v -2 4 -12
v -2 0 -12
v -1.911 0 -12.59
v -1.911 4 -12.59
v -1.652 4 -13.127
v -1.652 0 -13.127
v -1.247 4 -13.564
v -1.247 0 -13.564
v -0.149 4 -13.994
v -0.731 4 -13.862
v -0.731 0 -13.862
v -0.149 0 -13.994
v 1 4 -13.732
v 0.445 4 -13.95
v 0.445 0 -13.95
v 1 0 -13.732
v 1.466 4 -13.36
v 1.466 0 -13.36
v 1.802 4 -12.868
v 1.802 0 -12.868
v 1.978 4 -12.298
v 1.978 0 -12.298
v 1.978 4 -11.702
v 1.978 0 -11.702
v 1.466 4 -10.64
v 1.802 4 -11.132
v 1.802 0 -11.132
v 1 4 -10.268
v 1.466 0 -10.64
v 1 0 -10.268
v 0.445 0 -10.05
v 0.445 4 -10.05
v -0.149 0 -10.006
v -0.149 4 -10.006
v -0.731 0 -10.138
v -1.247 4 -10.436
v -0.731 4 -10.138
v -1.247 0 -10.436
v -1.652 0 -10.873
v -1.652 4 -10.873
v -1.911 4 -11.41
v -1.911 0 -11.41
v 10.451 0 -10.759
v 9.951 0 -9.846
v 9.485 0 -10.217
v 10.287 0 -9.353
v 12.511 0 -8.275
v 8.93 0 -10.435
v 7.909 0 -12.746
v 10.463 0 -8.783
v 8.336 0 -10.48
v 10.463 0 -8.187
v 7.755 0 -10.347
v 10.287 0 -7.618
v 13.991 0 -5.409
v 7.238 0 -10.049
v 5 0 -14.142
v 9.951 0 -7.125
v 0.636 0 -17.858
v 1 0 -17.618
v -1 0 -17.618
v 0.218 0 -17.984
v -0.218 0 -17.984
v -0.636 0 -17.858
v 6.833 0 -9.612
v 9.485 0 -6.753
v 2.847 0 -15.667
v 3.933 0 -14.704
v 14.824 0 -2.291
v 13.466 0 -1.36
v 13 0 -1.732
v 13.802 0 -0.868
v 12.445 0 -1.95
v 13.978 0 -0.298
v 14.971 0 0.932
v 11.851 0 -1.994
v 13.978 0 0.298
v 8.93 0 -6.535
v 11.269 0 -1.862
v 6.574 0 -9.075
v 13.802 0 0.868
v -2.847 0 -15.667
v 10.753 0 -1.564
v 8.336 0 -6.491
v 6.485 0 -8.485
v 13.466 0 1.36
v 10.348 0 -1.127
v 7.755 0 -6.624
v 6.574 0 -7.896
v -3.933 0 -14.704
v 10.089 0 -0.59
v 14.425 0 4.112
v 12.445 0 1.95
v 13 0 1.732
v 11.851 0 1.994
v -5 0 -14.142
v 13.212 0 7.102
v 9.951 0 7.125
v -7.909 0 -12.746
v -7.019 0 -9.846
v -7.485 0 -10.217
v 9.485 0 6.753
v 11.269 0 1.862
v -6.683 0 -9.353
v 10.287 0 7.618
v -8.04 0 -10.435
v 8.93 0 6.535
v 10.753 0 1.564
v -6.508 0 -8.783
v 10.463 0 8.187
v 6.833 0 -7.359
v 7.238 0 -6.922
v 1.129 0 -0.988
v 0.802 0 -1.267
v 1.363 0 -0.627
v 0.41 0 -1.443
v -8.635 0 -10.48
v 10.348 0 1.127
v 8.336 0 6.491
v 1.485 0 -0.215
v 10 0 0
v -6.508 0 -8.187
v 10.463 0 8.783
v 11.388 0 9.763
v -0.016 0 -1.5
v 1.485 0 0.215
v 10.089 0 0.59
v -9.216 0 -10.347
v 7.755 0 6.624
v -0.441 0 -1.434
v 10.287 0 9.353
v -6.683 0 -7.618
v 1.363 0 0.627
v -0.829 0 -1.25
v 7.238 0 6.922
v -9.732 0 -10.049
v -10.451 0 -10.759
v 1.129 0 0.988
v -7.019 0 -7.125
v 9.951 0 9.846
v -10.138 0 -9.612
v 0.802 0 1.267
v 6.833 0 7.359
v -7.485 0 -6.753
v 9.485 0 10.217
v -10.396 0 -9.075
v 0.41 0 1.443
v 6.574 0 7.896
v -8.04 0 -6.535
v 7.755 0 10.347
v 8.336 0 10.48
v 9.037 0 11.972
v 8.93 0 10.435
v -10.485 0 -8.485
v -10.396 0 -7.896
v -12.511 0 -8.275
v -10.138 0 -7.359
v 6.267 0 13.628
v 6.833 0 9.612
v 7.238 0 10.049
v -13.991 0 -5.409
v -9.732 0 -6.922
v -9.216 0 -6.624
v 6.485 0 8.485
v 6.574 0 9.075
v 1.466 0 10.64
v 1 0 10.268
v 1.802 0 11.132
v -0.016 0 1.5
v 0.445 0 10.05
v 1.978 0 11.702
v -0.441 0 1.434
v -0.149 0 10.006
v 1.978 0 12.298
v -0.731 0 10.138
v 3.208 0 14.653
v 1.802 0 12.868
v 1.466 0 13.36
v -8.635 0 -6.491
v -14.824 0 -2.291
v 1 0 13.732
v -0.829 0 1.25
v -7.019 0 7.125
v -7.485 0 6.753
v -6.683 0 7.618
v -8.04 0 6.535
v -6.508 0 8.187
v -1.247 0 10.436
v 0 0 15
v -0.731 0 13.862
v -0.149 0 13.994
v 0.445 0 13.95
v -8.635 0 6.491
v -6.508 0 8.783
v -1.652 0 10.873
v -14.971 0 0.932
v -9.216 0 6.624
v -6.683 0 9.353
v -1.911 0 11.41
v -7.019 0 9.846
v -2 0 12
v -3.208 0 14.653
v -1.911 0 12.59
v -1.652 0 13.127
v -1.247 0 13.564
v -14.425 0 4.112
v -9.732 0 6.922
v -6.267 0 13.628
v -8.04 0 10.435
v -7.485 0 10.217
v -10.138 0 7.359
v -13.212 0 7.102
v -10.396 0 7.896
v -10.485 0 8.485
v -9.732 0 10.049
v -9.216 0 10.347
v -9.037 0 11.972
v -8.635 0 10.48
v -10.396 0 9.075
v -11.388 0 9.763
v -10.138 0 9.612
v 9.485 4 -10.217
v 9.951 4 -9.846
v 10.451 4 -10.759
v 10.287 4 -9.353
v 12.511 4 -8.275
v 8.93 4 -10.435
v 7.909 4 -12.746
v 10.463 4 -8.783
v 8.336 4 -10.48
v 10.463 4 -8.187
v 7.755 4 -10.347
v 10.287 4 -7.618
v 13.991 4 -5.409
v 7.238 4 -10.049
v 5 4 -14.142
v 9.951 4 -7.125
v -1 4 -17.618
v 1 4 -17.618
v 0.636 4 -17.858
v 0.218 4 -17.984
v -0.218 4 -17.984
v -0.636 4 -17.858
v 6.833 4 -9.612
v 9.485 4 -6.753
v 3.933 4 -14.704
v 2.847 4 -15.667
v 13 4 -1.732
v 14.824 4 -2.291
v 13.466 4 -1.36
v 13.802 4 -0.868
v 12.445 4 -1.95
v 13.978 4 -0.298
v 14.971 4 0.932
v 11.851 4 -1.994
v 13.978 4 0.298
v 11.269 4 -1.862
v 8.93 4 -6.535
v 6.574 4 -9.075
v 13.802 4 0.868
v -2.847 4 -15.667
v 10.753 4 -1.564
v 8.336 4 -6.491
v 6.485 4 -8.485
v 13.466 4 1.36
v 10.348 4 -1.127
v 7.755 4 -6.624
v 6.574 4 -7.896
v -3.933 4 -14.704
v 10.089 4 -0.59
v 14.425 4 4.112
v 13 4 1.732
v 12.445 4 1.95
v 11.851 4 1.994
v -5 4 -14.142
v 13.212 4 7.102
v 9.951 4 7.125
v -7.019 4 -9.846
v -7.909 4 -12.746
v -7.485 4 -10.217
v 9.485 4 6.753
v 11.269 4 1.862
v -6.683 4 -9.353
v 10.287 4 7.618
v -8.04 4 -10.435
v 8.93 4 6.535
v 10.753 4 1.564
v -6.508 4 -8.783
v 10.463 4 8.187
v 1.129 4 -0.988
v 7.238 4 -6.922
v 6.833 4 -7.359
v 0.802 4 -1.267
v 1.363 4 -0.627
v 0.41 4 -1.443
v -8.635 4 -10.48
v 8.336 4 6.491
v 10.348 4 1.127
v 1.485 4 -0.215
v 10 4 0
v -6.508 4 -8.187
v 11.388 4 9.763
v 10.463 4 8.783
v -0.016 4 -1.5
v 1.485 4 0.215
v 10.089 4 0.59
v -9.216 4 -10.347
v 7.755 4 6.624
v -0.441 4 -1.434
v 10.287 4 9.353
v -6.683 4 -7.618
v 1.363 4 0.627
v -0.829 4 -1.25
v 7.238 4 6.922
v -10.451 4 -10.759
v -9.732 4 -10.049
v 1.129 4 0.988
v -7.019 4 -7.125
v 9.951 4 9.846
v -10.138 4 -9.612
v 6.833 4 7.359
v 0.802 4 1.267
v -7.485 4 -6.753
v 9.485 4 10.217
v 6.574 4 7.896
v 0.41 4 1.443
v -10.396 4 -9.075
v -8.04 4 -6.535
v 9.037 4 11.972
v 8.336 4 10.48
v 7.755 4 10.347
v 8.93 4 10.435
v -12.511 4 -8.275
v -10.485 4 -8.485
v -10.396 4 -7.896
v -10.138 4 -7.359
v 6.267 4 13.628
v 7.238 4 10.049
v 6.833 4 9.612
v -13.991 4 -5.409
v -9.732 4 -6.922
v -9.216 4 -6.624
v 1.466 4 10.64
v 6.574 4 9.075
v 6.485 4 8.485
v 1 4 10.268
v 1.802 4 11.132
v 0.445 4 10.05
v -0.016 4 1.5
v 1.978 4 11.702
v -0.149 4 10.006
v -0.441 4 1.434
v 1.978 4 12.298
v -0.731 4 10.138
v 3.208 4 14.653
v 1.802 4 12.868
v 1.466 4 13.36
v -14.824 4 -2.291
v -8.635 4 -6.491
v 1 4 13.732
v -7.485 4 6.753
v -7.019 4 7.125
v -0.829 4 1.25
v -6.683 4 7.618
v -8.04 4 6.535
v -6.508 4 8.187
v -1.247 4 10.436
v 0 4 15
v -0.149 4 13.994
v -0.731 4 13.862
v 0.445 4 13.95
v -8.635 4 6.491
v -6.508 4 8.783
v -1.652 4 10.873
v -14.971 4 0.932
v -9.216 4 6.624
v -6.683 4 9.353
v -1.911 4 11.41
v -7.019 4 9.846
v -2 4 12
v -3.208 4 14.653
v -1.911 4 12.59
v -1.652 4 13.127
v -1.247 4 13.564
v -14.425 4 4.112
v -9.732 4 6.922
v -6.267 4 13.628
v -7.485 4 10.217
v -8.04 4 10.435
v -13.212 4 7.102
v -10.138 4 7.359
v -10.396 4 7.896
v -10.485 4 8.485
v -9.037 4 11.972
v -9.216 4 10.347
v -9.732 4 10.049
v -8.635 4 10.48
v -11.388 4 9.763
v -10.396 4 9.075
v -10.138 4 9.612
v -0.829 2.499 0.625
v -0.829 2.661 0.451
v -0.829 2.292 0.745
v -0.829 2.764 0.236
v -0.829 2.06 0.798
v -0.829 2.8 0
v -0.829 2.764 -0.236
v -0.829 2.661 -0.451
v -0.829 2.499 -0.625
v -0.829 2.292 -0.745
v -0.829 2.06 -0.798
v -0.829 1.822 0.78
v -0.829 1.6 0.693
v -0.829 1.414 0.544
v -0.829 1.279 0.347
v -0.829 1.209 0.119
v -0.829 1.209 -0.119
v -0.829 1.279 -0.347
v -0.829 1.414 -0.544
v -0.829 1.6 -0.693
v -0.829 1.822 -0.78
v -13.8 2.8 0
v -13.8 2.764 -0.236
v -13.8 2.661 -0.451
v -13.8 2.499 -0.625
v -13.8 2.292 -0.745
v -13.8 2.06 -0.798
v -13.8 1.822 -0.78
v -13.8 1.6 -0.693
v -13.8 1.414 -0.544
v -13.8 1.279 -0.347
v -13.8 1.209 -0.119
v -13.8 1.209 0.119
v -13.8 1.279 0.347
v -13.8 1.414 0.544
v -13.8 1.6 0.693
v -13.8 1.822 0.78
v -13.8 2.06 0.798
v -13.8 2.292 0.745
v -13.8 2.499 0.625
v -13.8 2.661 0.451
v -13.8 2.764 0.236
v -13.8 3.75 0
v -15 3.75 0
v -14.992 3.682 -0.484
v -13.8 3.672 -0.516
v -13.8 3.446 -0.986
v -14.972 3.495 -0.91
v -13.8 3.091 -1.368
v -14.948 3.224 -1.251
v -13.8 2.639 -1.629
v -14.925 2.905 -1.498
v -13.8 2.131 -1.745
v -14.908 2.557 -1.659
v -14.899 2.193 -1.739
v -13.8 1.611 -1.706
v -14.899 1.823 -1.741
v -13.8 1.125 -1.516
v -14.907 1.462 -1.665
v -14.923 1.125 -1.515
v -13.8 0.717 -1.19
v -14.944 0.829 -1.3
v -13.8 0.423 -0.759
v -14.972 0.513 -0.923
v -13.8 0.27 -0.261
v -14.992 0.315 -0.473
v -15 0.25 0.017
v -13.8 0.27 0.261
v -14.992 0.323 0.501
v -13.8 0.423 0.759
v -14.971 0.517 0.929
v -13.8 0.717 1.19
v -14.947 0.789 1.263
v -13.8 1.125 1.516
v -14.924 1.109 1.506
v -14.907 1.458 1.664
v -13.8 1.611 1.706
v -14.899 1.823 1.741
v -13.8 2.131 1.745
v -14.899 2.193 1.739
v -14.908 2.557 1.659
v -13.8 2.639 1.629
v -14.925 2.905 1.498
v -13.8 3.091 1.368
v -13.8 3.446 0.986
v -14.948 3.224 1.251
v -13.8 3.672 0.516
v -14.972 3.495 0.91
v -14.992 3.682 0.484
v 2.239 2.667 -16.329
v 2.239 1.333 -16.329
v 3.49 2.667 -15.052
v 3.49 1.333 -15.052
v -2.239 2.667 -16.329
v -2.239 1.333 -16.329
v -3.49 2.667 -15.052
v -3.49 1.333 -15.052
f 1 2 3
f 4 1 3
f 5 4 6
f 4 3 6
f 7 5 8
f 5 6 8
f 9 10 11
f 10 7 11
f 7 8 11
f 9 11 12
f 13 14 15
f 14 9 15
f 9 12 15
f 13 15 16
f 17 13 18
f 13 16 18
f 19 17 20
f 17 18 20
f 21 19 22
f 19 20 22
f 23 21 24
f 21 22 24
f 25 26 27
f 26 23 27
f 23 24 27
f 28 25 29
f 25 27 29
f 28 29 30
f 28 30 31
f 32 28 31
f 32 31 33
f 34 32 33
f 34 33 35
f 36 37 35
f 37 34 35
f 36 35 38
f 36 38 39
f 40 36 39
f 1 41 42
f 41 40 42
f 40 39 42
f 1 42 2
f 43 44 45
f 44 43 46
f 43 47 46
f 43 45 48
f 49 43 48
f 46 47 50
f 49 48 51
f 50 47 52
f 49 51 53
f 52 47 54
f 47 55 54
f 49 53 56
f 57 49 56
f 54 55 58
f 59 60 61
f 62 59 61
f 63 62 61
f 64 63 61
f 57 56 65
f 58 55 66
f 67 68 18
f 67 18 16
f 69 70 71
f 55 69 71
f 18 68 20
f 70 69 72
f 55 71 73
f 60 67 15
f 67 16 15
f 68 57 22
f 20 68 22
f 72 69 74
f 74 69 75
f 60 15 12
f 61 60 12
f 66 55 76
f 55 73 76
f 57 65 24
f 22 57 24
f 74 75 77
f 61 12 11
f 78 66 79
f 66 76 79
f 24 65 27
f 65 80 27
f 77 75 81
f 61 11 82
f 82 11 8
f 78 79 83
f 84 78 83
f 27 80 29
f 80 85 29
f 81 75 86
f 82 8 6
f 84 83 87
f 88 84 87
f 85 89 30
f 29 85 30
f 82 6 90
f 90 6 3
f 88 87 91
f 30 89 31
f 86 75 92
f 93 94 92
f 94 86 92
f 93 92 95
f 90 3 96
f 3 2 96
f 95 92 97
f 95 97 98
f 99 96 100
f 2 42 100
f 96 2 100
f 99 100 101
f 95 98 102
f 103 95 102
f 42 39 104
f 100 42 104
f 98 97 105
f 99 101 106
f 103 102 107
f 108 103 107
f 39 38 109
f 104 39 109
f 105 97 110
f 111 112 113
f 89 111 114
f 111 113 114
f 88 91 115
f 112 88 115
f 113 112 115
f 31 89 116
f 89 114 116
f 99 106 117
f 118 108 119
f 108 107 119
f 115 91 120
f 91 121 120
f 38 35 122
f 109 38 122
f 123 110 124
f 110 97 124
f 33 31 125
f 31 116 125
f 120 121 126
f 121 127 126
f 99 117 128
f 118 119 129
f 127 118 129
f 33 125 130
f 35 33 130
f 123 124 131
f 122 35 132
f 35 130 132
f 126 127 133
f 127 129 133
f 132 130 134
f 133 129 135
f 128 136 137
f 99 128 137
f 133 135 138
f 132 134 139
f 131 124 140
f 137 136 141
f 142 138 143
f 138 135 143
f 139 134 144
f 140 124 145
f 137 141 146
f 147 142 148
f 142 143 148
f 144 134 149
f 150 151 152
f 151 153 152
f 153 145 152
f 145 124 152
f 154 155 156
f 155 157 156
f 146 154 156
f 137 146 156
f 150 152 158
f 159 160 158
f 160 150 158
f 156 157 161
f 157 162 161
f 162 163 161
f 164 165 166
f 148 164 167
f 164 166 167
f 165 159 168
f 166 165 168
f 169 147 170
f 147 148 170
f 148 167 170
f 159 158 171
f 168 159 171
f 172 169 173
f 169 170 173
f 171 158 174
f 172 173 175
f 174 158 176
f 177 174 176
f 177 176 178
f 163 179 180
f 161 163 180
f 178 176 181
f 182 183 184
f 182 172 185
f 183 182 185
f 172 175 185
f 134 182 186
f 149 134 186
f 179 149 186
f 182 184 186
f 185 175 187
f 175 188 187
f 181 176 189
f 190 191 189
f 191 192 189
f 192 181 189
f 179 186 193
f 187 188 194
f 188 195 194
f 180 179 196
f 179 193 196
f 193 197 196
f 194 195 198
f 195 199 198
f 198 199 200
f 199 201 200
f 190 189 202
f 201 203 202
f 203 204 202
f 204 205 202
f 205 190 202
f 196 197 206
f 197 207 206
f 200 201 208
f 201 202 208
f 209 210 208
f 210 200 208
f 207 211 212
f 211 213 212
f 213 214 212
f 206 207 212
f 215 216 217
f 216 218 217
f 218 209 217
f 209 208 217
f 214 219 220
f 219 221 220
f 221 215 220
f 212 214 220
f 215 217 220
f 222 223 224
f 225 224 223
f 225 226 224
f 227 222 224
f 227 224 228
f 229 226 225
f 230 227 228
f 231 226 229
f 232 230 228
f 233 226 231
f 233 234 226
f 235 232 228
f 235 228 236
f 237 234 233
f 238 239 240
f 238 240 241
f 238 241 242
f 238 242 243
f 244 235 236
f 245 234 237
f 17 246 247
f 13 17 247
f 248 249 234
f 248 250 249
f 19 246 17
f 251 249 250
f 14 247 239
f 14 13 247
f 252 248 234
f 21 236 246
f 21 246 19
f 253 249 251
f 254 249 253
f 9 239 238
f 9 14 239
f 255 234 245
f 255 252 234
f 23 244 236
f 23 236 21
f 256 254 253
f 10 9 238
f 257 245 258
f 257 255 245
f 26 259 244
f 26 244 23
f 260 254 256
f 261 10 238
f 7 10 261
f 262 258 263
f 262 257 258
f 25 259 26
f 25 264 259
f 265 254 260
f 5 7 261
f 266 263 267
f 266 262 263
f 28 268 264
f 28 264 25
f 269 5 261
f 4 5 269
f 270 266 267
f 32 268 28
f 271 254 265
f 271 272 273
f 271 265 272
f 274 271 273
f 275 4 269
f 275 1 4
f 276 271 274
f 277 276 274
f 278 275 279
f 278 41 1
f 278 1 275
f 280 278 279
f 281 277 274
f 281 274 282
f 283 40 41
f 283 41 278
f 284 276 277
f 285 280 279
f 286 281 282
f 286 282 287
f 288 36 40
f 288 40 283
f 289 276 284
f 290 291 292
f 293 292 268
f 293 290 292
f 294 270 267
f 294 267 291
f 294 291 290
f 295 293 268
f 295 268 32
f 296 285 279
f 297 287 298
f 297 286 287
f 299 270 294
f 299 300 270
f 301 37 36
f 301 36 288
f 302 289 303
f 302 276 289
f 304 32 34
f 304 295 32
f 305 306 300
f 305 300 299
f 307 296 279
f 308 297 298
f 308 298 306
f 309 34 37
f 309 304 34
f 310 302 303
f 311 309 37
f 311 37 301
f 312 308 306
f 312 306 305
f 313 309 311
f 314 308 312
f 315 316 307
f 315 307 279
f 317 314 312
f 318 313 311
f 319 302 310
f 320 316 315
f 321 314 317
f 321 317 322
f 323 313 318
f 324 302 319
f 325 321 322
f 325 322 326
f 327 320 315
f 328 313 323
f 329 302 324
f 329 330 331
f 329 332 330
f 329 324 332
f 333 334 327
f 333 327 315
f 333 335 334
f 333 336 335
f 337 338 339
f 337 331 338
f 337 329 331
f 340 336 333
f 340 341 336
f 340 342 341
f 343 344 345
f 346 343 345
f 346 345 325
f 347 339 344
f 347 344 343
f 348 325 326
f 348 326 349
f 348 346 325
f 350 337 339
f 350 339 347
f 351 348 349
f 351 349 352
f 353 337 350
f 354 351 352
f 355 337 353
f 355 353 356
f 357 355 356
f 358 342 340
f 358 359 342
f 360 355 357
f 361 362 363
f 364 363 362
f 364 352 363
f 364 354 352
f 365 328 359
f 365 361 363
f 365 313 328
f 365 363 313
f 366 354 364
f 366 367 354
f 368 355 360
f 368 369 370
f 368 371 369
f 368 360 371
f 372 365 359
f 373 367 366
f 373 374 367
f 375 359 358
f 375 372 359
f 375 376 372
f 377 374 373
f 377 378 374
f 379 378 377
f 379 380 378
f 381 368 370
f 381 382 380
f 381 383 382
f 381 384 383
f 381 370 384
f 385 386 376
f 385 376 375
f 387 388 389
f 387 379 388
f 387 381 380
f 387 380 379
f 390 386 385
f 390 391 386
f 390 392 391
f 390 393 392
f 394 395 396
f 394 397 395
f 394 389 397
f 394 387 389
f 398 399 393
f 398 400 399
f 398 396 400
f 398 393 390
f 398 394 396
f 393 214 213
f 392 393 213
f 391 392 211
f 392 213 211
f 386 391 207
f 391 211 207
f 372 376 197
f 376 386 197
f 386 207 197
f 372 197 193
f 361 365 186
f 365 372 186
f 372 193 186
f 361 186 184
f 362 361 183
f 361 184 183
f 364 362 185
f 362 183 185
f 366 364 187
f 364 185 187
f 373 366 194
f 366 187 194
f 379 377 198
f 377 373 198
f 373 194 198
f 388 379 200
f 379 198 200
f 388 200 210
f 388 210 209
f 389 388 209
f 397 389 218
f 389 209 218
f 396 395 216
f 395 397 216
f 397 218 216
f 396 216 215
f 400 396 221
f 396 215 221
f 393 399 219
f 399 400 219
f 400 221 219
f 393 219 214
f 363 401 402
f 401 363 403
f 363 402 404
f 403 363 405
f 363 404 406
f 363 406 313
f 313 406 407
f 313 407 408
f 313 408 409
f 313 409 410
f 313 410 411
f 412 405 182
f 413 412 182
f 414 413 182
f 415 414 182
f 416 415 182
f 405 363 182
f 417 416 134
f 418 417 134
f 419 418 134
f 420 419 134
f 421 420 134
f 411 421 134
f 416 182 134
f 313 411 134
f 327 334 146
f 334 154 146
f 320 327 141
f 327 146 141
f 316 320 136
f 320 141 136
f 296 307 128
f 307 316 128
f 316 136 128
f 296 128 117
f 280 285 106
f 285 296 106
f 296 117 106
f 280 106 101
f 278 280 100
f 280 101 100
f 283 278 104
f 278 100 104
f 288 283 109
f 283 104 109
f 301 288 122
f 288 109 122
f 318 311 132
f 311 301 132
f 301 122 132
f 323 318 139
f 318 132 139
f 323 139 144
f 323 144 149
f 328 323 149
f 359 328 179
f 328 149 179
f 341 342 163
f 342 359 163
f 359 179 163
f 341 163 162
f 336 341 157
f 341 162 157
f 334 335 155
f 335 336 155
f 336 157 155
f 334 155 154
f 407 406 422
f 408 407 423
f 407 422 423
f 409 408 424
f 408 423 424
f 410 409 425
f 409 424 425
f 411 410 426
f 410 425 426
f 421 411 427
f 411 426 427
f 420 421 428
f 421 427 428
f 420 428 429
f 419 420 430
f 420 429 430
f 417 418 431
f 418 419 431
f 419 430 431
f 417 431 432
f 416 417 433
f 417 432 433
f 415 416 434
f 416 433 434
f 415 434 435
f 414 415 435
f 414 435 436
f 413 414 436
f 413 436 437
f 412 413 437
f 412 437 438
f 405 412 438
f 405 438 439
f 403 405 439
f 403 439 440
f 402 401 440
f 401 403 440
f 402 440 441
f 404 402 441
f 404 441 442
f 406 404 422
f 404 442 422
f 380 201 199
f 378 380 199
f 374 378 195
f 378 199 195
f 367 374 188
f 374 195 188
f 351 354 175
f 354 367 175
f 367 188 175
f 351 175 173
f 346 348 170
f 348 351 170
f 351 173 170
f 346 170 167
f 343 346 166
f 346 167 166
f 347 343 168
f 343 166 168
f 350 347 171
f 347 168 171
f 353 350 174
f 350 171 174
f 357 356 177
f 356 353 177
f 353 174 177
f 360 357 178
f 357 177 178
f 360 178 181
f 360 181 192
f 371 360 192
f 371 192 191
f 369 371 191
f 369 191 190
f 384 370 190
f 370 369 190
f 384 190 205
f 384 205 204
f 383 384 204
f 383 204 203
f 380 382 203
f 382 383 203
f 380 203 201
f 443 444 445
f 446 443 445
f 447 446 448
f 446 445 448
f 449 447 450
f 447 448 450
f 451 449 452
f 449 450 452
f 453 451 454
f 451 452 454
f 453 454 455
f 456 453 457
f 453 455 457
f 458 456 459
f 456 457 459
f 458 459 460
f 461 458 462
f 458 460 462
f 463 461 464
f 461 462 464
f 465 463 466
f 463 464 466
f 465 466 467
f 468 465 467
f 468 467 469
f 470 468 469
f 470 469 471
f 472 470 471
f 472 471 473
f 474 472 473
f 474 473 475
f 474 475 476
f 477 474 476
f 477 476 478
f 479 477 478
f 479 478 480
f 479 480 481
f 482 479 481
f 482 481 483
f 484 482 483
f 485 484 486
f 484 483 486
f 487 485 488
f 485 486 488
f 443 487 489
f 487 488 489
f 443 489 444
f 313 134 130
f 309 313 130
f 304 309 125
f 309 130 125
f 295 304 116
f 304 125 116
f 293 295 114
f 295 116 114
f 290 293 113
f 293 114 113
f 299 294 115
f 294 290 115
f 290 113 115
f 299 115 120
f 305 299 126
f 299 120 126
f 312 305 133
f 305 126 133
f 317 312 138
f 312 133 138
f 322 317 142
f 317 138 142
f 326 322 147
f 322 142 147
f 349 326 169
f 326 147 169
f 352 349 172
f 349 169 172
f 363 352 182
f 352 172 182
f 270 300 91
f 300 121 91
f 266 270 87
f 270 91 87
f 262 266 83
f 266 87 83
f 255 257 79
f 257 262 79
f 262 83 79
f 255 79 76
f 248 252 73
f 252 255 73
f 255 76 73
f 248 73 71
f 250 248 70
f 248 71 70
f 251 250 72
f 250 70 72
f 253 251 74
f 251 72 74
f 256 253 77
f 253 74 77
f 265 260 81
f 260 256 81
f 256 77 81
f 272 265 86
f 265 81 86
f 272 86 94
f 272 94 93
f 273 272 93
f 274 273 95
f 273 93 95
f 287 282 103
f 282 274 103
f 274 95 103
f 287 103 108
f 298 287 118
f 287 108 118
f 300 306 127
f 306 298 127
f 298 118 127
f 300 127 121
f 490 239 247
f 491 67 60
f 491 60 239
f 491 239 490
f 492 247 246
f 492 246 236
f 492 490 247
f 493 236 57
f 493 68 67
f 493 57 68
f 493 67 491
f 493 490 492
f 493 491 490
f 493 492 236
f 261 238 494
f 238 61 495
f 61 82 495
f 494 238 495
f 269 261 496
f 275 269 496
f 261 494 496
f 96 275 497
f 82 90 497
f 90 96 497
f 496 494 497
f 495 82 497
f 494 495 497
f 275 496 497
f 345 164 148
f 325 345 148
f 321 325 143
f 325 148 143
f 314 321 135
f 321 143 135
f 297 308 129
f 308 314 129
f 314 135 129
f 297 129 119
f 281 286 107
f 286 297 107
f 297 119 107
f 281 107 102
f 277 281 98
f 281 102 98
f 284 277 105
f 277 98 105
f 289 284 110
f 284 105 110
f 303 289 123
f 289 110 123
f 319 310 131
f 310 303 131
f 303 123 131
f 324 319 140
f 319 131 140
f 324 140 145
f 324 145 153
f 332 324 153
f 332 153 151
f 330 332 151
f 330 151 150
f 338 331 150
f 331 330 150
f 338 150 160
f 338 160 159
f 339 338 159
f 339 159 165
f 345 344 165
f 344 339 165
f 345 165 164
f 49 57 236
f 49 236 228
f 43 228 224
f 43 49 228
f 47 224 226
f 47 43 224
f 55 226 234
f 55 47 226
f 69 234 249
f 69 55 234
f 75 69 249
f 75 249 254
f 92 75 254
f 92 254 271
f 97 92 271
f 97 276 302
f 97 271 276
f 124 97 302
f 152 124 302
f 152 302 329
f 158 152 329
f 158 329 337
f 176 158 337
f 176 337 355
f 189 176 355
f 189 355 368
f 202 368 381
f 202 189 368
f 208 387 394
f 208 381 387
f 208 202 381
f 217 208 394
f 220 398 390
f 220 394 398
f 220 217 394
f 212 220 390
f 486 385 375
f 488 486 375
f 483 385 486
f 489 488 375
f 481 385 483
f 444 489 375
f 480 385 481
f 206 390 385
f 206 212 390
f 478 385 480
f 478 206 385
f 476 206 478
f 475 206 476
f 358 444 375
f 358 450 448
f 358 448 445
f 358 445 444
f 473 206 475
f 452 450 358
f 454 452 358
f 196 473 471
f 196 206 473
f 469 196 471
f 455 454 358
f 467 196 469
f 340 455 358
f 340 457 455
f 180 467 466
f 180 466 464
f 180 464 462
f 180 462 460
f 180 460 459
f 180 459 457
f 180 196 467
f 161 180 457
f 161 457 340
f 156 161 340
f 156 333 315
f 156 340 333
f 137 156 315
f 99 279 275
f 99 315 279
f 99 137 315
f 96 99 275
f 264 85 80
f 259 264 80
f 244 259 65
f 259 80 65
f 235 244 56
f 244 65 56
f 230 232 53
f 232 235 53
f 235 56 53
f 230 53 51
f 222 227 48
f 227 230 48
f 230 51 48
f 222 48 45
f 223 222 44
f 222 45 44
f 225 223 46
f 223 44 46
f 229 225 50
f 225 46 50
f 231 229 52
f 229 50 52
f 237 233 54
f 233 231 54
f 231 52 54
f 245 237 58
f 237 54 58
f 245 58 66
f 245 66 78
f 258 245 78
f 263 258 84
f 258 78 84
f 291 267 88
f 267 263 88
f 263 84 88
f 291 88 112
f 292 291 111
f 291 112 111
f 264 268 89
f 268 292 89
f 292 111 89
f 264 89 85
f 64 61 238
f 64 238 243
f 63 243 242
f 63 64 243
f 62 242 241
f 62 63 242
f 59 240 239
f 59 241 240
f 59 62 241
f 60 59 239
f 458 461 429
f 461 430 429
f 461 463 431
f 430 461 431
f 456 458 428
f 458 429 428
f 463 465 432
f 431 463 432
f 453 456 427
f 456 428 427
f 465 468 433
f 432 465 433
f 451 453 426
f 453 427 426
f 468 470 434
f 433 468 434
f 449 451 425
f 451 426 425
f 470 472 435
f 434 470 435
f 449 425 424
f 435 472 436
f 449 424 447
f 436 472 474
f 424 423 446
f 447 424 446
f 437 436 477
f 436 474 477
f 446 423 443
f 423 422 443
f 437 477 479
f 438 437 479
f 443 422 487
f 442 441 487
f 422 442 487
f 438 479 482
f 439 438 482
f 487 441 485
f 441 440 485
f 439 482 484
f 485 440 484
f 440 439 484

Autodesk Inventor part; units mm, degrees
ref_plane "XZ Plane" through (0, 0, 0) normal (0, 1, 0) x (-1, 0, 0)
ref_plane "XY Plane" through (0, 0, 0) normal (0, 0, 1) x (1, 0, 0)
sketch "Sketch1" plane through (0, 0, 0) normal (0, 1, 0) x (-1, 0, 0)
  arc A0 (0.8292, 1.25) -> (0.8292, -1.25) centre (0, 0) ccw
  line L0 (0.8292, 1.25) -> (0.8292, -1.25)
  circle A1 centre (0, 0) radius 15 construction
  circle A2 centre (0, 0) radius 18 construction
  line L1 (0, -15) -> (0, -18) construction
  arc A3 (-1, -17.618) -> (1, -17.618) centre (0, -16.5) ccw
  spline S0 degree 3 poles (1, -17.618) (2.3167, -16.4404) (3.2766, -14.7515) (5, -14.1421) knots 0 0 0 0 1 1 1 1
  spline S1 degree 3 poles (-1, -17.618) (-2.3167, -16.4404) (-3.2766, -14.7515) (-5, -14.1421) knots 0 0 0 0 1 1 1 1
  arc A4 (5, -14.1421) -> (-5, -14.1421) centre (0, 0) ccw
  line L2 (0, 0) -> (13.7006, 0) construction
  line L3 (0, 0) -> (0, -3.6917) construction
  circle A5 centre (-12, 0) radius 2
  circle A6 centre (-8.4853, -8.4853) radius 2
  circle A7 centre (0, -12) radius 2
  circle A8 centre (8.4853, -8.4853) radius 2
  circle A9 centre (12, 0) radius 2 construction
  circle A10 centre (8.4853, 8.4853) radius 2
  circle A11 centre (0, 12) radius 2
  circle A12 centre (-8.4853, 8.4853) radius 2
  dimension "d50" = 36
  dimension "d0" = 3
  dimension "d1" = 2.5
  dimension "d2" = 30
  dimension "d7" = 5
  dimension "d8" = 1
  dimension "d9" = 5
  dimension "d29" = 12
  dimension "d30" = 4
  dimension "d33" = 360
extrude "Extrusion1" add sketch "Sketch1" along normal blind 4
ref_plane "Work Plane1" through (-15, 0, 0) normal (1, 0, 0) x (0, 1, 0)
ref_plane "Work Plane2" through (-15, 0, 0) normal (1, 0, 0) x (0, 1, 0)
sketch "Sketch6" plane through (-15, 0, 0) normal (1, 0, 0) x (0, 1, 0)
  line L0 (4, -14.1421) -> (4, 15) construction
  line L1 (0, 15) -> (0, -14.1421) construction
  line L2 (0, 0) -> (4, 0) construction
  circle A0 centre (2, 0) radius 1.75
  dimension "d41" = 3.5
extrude "Extrusion6" cut sketch "Sketch6" along normal blind 1.2
sketch "Sketch8" plane through (-15, 0, 0) normal (1, 0, 0) x (0, 1, 0)
  circle A0 centre (2, 0) radius 0.8
  point P0 (0, 0)
  dimension "d47" = 1.6
extrude "Extrusion8" cut sketch "Sketch8" along normal up to surface (14.1708 mm away)
properties part number "servo horn"
